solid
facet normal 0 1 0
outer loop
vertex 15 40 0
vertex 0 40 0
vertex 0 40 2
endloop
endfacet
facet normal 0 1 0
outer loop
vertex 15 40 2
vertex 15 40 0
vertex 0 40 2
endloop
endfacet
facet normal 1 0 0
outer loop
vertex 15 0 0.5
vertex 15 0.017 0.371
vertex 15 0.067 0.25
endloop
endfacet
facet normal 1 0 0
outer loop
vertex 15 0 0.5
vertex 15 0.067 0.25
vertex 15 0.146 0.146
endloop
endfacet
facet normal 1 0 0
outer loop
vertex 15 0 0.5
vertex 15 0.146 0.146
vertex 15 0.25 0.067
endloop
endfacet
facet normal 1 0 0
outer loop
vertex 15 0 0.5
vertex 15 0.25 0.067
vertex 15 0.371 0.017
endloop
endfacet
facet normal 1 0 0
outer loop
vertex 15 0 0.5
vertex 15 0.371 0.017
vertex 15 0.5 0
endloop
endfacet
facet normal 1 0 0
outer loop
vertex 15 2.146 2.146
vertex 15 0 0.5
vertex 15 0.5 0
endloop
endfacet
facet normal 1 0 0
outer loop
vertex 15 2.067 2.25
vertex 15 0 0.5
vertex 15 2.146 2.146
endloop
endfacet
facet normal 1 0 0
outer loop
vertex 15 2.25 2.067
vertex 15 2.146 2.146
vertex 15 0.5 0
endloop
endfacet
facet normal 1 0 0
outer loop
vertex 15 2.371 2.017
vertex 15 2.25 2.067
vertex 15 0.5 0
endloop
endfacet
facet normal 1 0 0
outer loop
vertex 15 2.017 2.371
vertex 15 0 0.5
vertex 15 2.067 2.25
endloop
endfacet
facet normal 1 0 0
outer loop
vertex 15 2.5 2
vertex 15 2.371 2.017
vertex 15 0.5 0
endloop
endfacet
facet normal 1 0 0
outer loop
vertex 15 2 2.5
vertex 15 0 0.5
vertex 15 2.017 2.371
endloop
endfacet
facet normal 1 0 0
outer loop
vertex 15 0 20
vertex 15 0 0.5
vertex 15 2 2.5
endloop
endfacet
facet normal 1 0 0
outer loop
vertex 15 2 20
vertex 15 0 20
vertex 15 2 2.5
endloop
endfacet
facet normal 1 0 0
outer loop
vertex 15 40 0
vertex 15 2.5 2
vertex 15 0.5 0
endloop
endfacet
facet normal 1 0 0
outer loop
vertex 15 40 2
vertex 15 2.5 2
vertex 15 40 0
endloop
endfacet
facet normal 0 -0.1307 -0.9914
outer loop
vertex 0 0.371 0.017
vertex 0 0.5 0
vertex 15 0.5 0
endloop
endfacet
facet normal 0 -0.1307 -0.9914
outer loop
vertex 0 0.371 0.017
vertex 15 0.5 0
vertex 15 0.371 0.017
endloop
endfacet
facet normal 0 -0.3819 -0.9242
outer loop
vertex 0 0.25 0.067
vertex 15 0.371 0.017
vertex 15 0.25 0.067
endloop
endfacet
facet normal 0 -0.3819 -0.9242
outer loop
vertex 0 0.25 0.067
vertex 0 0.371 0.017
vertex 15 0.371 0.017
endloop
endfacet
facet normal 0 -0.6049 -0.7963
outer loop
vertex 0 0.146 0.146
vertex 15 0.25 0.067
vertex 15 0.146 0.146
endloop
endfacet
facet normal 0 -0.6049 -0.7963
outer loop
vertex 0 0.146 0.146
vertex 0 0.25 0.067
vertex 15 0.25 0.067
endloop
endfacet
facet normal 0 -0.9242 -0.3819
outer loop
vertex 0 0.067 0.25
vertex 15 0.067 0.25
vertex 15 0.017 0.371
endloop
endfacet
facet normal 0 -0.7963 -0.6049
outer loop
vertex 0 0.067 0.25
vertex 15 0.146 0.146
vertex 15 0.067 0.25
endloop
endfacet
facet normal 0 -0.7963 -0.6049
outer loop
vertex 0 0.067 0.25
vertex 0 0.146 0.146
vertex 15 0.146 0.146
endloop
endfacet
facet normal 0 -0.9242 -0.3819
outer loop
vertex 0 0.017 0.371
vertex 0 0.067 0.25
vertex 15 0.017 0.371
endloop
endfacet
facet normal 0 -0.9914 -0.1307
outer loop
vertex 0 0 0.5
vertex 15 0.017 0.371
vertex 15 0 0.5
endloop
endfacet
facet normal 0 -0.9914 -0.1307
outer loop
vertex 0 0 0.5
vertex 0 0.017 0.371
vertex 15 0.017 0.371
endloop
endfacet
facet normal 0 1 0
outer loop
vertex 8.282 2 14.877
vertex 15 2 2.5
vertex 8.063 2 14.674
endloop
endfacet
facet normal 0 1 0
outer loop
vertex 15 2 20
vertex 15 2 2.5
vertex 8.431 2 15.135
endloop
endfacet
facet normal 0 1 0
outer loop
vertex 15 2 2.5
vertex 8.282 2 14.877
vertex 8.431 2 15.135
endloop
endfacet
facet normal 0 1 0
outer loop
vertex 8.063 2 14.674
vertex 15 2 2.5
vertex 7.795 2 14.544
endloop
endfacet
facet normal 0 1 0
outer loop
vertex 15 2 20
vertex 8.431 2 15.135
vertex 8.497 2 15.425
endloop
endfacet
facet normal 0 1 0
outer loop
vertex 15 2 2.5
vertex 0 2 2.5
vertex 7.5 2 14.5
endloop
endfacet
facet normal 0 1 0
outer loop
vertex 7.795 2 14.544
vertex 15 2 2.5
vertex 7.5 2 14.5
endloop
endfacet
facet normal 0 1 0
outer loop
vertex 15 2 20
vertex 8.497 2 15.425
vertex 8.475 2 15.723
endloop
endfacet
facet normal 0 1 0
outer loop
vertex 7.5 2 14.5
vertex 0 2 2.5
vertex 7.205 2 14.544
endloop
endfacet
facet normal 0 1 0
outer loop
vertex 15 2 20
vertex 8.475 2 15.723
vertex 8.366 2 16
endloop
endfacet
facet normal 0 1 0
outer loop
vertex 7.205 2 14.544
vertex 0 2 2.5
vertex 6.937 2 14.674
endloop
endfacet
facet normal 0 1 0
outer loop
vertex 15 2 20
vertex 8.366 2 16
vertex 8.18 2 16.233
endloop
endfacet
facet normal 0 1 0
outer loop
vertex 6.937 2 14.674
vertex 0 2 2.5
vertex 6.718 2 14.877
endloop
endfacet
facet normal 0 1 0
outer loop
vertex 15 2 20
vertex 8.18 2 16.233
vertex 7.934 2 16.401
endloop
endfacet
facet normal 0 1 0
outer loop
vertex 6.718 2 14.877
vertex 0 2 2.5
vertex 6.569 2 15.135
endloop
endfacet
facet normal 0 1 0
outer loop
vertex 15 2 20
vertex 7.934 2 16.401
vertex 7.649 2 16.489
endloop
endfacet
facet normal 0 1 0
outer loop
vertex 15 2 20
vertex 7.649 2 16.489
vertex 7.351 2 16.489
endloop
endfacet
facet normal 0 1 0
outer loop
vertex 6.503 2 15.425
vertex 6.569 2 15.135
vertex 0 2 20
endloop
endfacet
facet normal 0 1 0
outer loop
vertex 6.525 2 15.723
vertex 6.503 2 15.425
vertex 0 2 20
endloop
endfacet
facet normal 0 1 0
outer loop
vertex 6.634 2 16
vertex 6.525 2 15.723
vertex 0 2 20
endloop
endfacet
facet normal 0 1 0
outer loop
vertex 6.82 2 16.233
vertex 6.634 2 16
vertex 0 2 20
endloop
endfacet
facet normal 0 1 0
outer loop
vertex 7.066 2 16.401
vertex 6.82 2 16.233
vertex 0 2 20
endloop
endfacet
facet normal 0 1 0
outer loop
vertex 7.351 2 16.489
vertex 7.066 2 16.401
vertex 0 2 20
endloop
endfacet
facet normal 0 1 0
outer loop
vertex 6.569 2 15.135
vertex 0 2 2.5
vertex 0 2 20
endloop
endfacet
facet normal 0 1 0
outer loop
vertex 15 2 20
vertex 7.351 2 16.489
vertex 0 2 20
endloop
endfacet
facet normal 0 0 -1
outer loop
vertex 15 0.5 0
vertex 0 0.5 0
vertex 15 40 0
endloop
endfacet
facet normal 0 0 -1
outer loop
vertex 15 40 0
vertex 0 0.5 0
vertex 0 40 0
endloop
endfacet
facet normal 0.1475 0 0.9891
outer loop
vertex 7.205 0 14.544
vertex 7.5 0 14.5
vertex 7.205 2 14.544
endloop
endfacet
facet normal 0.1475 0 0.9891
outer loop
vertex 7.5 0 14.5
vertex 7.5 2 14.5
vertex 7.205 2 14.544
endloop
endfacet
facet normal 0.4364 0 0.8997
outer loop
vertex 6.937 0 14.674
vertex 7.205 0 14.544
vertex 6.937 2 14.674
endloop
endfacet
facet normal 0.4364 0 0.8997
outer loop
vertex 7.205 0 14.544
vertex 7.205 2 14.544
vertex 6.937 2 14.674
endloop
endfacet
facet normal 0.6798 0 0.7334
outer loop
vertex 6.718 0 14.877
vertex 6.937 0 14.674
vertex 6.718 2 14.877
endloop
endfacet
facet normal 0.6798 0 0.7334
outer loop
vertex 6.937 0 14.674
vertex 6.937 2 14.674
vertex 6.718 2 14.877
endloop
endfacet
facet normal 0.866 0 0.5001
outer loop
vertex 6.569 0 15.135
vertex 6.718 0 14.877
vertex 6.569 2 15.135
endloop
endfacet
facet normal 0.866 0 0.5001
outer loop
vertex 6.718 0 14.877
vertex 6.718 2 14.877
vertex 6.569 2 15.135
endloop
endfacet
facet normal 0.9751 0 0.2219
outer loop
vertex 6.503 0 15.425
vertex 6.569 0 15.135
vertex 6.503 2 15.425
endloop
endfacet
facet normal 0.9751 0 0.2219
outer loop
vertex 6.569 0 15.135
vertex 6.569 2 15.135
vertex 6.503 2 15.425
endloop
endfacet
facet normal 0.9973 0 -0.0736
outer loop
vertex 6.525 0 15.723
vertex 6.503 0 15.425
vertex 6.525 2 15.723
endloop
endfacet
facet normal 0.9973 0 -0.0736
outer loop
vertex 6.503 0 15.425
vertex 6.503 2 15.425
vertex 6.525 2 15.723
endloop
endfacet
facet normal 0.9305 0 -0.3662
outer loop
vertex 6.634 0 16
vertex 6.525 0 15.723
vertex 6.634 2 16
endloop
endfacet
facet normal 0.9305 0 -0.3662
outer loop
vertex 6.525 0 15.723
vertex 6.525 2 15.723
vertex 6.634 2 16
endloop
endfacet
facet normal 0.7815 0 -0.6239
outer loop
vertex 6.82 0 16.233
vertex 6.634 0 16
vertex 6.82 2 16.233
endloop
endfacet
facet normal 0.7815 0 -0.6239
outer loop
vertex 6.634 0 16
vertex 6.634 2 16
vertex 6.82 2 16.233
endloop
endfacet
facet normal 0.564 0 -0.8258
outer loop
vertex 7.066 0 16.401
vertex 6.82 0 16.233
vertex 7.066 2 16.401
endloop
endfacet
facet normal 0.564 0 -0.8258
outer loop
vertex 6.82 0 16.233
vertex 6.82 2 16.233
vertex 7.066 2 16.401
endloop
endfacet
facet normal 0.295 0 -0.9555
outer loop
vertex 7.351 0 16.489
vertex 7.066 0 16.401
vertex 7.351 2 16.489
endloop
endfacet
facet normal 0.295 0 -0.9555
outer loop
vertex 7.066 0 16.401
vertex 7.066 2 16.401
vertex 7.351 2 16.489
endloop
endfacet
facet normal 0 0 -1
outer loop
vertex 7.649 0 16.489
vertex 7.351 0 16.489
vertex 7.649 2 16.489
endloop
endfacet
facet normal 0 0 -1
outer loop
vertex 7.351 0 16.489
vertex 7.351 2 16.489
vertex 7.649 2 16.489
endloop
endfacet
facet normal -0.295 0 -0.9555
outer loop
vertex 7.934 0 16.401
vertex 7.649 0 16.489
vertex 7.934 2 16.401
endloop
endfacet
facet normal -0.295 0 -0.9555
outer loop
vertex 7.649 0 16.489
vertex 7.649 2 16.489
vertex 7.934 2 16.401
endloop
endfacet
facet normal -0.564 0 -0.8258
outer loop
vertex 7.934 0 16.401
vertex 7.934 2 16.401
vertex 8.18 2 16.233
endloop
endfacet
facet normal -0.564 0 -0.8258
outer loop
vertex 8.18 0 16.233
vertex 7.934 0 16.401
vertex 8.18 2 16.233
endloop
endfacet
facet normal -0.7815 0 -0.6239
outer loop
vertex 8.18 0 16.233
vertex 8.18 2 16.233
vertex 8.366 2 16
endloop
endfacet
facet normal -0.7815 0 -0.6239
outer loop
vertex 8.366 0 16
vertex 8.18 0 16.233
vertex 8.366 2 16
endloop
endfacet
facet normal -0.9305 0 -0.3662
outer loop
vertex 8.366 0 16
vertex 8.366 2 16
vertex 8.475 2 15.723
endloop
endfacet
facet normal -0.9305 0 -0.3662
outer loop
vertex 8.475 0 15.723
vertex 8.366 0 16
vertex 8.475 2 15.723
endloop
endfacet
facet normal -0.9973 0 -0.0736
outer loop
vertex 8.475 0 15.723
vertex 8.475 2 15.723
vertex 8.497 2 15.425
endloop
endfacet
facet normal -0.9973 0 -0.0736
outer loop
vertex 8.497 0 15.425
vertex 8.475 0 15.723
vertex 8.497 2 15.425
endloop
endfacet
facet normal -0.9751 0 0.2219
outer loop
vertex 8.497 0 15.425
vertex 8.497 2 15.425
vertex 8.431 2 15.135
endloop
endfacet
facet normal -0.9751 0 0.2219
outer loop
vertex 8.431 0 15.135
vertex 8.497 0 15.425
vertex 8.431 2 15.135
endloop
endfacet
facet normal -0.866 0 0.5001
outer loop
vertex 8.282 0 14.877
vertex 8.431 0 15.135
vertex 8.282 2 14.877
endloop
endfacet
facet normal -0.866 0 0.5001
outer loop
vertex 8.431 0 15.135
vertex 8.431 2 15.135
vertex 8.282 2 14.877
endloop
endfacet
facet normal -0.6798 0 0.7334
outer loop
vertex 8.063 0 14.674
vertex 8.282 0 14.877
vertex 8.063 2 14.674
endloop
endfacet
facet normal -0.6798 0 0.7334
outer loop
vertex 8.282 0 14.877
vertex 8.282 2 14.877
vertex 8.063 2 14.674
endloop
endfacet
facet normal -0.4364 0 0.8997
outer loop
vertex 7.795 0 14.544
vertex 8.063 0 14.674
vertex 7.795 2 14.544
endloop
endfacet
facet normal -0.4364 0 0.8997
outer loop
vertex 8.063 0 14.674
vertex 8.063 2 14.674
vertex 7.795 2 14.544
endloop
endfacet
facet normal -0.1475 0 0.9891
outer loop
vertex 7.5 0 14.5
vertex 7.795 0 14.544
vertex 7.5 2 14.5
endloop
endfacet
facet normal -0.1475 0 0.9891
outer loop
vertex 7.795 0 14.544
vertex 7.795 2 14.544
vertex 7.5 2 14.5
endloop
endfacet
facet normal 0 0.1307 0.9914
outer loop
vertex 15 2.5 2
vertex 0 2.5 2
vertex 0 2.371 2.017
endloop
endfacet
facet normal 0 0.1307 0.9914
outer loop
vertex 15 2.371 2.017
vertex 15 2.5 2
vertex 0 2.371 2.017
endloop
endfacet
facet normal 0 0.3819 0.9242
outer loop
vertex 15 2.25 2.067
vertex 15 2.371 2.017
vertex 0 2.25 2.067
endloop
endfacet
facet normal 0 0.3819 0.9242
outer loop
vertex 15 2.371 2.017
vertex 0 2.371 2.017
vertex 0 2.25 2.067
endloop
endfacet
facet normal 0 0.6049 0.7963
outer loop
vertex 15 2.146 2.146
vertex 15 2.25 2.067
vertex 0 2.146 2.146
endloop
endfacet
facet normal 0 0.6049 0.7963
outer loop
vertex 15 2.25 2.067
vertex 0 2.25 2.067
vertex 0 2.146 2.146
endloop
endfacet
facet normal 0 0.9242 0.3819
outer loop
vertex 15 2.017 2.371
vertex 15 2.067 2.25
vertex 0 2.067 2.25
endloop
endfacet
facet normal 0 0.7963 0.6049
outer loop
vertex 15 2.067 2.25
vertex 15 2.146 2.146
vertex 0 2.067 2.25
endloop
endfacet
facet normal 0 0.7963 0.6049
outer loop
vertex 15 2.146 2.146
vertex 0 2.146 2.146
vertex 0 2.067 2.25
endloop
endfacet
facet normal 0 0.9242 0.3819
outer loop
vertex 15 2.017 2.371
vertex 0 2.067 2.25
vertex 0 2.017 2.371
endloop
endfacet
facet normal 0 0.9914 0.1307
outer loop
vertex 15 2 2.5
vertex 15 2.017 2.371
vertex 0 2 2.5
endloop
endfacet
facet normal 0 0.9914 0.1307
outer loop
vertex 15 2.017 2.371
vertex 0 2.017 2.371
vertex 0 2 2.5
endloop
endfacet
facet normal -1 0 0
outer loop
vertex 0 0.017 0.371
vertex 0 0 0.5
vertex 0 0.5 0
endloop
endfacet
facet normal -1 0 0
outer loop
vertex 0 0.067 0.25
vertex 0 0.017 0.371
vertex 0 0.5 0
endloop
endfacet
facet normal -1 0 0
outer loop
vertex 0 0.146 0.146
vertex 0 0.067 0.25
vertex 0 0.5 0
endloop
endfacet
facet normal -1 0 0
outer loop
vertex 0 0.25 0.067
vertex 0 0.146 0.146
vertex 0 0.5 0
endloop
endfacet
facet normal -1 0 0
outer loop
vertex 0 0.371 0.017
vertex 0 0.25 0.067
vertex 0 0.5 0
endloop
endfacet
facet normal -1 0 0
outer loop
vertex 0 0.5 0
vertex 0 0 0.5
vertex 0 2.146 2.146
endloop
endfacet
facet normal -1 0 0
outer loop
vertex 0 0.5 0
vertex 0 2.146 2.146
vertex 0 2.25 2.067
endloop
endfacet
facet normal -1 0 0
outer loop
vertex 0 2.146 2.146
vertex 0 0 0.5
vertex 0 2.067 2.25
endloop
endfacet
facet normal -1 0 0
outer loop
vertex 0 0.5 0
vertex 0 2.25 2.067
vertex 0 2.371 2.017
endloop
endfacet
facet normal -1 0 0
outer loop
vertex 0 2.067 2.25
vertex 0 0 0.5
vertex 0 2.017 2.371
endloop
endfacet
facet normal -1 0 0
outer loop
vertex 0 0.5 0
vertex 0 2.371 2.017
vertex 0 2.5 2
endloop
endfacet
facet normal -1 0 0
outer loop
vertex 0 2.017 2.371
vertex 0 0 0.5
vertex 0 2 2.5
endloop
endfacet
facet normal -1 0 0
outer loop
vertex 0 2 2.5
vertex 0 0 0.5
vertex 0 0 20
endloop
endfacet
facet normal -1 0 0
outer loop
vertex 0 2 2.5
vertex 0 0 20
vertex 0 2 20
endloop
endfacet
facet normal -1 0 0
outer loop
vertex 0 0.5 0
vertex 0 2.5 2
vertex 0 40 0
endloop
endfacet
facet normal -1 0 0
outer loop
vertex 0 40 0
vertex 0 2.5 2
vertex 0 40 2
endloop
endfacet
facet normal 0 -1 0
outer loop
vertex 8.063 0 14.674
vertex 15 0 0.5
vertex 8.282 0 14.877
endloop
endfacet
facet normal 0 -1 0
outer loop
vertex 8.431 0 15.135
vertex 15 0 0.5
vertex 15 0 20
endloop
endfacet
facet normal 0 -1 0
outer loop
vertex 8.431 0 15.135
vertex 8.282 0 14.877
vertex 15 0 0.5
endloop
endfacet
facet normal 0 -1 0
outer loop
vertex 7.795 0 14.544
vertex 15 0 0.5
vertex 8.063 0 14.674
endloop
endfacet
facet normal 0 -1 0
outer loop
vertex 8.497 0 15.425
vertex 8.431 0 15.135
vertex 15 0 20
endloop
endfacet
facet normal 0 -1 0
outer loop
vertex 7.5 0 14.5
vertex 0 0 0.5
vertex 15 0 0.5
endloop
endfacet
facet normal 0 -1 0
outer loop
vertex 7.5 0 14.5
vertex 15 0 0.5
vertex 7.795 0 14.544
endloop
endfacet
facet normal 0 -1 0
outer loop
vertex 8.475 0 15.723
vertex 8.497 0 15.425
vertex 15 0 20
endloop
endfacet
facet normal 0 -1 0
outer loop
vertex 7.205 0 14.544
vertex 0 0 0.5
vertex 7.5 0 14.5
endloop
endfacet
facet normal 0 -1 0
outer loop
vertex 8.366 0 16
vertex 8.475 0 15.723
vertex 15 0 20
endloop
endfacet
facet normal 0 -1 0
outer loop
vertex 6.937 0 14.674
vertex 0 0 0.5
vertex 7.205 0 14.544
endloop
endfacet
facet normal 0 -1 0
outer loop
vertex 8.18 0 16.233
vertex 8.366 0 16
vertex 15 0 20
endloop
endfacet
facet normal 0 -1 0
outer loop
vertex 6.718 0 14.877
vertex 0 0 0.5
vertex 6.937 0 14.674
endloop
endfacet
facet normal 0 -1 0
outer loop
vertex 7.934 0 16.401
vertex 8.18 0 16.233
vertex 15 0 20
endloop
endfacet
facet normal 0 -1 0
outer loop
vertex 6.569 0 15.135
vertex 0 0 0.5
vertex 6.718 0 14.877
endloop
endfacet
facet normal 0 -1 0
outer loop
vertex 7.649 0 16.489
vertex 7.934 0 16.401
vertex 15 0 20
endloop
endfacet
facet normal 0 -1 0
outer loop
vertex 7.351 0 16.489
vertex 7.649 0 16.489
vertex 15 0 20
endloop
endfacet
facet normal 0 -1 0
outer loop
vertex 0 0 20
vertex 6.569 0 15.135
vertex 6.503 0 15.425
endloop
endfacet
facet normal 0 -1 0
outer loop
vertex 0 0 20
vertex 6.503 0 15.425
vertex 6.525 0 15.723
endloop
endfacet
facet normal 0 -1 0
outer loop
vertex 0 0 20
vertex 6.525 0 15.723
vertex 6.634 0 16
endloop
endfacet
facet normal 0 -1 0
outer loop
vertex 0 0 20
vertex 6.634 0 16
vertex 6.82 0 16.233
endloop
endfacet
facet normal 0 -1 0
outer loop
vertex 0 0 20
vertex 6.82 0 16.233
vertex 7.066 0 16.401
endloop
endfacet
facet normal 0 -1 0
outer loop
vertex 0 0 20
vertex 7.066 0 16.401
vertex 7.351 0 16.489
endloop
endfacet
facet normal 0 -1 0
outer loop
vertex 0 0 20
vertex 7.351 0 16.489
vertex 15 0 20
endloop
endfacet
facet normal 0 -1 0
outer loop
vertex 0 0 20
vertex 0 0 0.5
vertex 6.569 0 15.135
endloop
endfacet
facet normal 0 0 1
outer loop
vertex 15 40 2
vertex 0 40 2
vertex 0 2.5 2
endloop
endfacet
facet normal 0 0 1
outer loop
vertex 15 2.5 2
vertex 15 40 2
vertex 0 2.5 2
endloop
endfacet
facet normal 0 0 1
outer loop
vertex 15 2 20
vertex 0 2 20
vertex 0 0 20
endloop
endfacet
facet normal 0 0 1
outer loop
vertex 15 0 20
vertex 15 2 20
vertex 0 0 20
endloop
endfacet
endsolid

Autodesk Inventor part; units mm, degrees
ref_plane "YZ Plane" through (0, 0, 0) normal (1, 0, 0) x (0, 1, 0)
ref_plane "XZ Plane" through (0, 0, 0) normal (0, 1, 0) x (-1, 0, 0)
ref_plane "XY Plane" through (0, 0, 0) normal (0, 0, 1) x (1, 0, 0)
sketch "Szkic2" plane through (0, 0, 0) normal (1, 0, 0) x (0, 1, 0)
  line L0 (-10.1243, 0) -> (60.0207, 0)
  line L1 (0, -10.1243) -> (0, 60.0207)
  line L2 (0, 20) -> (0, 0.5)
  line L3 (0.5, 0) -> (40, 0)
  line L4 (40, 2) -> (2.5, 2)
  line L5 (2, 2.5) -> (2, 20)
  line L6 (2, 20) -> (0, 20)
  line L7 (40, 0) -> (40, 2)
  arc A0 (2, 2.5) -> (2.5, 2) centre (2.5, 2.5) ccw
  arc A1 (0, 0.5) -> (0.5, 0) centre (0.5, 0.5) ccw
  point P0 (0, 0)
  point P1 (0, 0)
  dimension "d4" = 2
  dimension "d5" = 2
  dimension "d6" = 40
  dimension "d7" = 20
  dimension "d8" = 0.5
extrude "Wyciągnięcie proste1" add sketch "Szkic2" along normal blind 15 contours A1 L1 L6 L5 A0 L4 L7 L0
sketch "Szkic3" plane through (0, 0, 0.5) normal (0, -1, 0) x (1, 0, 0)
  circle A0 centre (7.5, 15) radius 1
  point P0 (0, -0.5)
  dimension "d11" = 2
hole "Otwór1" at (7.5, 0, 15.5) direction (0, 1, 0) diameter 2 end through all
properties part number "kątownik_bloczek"
